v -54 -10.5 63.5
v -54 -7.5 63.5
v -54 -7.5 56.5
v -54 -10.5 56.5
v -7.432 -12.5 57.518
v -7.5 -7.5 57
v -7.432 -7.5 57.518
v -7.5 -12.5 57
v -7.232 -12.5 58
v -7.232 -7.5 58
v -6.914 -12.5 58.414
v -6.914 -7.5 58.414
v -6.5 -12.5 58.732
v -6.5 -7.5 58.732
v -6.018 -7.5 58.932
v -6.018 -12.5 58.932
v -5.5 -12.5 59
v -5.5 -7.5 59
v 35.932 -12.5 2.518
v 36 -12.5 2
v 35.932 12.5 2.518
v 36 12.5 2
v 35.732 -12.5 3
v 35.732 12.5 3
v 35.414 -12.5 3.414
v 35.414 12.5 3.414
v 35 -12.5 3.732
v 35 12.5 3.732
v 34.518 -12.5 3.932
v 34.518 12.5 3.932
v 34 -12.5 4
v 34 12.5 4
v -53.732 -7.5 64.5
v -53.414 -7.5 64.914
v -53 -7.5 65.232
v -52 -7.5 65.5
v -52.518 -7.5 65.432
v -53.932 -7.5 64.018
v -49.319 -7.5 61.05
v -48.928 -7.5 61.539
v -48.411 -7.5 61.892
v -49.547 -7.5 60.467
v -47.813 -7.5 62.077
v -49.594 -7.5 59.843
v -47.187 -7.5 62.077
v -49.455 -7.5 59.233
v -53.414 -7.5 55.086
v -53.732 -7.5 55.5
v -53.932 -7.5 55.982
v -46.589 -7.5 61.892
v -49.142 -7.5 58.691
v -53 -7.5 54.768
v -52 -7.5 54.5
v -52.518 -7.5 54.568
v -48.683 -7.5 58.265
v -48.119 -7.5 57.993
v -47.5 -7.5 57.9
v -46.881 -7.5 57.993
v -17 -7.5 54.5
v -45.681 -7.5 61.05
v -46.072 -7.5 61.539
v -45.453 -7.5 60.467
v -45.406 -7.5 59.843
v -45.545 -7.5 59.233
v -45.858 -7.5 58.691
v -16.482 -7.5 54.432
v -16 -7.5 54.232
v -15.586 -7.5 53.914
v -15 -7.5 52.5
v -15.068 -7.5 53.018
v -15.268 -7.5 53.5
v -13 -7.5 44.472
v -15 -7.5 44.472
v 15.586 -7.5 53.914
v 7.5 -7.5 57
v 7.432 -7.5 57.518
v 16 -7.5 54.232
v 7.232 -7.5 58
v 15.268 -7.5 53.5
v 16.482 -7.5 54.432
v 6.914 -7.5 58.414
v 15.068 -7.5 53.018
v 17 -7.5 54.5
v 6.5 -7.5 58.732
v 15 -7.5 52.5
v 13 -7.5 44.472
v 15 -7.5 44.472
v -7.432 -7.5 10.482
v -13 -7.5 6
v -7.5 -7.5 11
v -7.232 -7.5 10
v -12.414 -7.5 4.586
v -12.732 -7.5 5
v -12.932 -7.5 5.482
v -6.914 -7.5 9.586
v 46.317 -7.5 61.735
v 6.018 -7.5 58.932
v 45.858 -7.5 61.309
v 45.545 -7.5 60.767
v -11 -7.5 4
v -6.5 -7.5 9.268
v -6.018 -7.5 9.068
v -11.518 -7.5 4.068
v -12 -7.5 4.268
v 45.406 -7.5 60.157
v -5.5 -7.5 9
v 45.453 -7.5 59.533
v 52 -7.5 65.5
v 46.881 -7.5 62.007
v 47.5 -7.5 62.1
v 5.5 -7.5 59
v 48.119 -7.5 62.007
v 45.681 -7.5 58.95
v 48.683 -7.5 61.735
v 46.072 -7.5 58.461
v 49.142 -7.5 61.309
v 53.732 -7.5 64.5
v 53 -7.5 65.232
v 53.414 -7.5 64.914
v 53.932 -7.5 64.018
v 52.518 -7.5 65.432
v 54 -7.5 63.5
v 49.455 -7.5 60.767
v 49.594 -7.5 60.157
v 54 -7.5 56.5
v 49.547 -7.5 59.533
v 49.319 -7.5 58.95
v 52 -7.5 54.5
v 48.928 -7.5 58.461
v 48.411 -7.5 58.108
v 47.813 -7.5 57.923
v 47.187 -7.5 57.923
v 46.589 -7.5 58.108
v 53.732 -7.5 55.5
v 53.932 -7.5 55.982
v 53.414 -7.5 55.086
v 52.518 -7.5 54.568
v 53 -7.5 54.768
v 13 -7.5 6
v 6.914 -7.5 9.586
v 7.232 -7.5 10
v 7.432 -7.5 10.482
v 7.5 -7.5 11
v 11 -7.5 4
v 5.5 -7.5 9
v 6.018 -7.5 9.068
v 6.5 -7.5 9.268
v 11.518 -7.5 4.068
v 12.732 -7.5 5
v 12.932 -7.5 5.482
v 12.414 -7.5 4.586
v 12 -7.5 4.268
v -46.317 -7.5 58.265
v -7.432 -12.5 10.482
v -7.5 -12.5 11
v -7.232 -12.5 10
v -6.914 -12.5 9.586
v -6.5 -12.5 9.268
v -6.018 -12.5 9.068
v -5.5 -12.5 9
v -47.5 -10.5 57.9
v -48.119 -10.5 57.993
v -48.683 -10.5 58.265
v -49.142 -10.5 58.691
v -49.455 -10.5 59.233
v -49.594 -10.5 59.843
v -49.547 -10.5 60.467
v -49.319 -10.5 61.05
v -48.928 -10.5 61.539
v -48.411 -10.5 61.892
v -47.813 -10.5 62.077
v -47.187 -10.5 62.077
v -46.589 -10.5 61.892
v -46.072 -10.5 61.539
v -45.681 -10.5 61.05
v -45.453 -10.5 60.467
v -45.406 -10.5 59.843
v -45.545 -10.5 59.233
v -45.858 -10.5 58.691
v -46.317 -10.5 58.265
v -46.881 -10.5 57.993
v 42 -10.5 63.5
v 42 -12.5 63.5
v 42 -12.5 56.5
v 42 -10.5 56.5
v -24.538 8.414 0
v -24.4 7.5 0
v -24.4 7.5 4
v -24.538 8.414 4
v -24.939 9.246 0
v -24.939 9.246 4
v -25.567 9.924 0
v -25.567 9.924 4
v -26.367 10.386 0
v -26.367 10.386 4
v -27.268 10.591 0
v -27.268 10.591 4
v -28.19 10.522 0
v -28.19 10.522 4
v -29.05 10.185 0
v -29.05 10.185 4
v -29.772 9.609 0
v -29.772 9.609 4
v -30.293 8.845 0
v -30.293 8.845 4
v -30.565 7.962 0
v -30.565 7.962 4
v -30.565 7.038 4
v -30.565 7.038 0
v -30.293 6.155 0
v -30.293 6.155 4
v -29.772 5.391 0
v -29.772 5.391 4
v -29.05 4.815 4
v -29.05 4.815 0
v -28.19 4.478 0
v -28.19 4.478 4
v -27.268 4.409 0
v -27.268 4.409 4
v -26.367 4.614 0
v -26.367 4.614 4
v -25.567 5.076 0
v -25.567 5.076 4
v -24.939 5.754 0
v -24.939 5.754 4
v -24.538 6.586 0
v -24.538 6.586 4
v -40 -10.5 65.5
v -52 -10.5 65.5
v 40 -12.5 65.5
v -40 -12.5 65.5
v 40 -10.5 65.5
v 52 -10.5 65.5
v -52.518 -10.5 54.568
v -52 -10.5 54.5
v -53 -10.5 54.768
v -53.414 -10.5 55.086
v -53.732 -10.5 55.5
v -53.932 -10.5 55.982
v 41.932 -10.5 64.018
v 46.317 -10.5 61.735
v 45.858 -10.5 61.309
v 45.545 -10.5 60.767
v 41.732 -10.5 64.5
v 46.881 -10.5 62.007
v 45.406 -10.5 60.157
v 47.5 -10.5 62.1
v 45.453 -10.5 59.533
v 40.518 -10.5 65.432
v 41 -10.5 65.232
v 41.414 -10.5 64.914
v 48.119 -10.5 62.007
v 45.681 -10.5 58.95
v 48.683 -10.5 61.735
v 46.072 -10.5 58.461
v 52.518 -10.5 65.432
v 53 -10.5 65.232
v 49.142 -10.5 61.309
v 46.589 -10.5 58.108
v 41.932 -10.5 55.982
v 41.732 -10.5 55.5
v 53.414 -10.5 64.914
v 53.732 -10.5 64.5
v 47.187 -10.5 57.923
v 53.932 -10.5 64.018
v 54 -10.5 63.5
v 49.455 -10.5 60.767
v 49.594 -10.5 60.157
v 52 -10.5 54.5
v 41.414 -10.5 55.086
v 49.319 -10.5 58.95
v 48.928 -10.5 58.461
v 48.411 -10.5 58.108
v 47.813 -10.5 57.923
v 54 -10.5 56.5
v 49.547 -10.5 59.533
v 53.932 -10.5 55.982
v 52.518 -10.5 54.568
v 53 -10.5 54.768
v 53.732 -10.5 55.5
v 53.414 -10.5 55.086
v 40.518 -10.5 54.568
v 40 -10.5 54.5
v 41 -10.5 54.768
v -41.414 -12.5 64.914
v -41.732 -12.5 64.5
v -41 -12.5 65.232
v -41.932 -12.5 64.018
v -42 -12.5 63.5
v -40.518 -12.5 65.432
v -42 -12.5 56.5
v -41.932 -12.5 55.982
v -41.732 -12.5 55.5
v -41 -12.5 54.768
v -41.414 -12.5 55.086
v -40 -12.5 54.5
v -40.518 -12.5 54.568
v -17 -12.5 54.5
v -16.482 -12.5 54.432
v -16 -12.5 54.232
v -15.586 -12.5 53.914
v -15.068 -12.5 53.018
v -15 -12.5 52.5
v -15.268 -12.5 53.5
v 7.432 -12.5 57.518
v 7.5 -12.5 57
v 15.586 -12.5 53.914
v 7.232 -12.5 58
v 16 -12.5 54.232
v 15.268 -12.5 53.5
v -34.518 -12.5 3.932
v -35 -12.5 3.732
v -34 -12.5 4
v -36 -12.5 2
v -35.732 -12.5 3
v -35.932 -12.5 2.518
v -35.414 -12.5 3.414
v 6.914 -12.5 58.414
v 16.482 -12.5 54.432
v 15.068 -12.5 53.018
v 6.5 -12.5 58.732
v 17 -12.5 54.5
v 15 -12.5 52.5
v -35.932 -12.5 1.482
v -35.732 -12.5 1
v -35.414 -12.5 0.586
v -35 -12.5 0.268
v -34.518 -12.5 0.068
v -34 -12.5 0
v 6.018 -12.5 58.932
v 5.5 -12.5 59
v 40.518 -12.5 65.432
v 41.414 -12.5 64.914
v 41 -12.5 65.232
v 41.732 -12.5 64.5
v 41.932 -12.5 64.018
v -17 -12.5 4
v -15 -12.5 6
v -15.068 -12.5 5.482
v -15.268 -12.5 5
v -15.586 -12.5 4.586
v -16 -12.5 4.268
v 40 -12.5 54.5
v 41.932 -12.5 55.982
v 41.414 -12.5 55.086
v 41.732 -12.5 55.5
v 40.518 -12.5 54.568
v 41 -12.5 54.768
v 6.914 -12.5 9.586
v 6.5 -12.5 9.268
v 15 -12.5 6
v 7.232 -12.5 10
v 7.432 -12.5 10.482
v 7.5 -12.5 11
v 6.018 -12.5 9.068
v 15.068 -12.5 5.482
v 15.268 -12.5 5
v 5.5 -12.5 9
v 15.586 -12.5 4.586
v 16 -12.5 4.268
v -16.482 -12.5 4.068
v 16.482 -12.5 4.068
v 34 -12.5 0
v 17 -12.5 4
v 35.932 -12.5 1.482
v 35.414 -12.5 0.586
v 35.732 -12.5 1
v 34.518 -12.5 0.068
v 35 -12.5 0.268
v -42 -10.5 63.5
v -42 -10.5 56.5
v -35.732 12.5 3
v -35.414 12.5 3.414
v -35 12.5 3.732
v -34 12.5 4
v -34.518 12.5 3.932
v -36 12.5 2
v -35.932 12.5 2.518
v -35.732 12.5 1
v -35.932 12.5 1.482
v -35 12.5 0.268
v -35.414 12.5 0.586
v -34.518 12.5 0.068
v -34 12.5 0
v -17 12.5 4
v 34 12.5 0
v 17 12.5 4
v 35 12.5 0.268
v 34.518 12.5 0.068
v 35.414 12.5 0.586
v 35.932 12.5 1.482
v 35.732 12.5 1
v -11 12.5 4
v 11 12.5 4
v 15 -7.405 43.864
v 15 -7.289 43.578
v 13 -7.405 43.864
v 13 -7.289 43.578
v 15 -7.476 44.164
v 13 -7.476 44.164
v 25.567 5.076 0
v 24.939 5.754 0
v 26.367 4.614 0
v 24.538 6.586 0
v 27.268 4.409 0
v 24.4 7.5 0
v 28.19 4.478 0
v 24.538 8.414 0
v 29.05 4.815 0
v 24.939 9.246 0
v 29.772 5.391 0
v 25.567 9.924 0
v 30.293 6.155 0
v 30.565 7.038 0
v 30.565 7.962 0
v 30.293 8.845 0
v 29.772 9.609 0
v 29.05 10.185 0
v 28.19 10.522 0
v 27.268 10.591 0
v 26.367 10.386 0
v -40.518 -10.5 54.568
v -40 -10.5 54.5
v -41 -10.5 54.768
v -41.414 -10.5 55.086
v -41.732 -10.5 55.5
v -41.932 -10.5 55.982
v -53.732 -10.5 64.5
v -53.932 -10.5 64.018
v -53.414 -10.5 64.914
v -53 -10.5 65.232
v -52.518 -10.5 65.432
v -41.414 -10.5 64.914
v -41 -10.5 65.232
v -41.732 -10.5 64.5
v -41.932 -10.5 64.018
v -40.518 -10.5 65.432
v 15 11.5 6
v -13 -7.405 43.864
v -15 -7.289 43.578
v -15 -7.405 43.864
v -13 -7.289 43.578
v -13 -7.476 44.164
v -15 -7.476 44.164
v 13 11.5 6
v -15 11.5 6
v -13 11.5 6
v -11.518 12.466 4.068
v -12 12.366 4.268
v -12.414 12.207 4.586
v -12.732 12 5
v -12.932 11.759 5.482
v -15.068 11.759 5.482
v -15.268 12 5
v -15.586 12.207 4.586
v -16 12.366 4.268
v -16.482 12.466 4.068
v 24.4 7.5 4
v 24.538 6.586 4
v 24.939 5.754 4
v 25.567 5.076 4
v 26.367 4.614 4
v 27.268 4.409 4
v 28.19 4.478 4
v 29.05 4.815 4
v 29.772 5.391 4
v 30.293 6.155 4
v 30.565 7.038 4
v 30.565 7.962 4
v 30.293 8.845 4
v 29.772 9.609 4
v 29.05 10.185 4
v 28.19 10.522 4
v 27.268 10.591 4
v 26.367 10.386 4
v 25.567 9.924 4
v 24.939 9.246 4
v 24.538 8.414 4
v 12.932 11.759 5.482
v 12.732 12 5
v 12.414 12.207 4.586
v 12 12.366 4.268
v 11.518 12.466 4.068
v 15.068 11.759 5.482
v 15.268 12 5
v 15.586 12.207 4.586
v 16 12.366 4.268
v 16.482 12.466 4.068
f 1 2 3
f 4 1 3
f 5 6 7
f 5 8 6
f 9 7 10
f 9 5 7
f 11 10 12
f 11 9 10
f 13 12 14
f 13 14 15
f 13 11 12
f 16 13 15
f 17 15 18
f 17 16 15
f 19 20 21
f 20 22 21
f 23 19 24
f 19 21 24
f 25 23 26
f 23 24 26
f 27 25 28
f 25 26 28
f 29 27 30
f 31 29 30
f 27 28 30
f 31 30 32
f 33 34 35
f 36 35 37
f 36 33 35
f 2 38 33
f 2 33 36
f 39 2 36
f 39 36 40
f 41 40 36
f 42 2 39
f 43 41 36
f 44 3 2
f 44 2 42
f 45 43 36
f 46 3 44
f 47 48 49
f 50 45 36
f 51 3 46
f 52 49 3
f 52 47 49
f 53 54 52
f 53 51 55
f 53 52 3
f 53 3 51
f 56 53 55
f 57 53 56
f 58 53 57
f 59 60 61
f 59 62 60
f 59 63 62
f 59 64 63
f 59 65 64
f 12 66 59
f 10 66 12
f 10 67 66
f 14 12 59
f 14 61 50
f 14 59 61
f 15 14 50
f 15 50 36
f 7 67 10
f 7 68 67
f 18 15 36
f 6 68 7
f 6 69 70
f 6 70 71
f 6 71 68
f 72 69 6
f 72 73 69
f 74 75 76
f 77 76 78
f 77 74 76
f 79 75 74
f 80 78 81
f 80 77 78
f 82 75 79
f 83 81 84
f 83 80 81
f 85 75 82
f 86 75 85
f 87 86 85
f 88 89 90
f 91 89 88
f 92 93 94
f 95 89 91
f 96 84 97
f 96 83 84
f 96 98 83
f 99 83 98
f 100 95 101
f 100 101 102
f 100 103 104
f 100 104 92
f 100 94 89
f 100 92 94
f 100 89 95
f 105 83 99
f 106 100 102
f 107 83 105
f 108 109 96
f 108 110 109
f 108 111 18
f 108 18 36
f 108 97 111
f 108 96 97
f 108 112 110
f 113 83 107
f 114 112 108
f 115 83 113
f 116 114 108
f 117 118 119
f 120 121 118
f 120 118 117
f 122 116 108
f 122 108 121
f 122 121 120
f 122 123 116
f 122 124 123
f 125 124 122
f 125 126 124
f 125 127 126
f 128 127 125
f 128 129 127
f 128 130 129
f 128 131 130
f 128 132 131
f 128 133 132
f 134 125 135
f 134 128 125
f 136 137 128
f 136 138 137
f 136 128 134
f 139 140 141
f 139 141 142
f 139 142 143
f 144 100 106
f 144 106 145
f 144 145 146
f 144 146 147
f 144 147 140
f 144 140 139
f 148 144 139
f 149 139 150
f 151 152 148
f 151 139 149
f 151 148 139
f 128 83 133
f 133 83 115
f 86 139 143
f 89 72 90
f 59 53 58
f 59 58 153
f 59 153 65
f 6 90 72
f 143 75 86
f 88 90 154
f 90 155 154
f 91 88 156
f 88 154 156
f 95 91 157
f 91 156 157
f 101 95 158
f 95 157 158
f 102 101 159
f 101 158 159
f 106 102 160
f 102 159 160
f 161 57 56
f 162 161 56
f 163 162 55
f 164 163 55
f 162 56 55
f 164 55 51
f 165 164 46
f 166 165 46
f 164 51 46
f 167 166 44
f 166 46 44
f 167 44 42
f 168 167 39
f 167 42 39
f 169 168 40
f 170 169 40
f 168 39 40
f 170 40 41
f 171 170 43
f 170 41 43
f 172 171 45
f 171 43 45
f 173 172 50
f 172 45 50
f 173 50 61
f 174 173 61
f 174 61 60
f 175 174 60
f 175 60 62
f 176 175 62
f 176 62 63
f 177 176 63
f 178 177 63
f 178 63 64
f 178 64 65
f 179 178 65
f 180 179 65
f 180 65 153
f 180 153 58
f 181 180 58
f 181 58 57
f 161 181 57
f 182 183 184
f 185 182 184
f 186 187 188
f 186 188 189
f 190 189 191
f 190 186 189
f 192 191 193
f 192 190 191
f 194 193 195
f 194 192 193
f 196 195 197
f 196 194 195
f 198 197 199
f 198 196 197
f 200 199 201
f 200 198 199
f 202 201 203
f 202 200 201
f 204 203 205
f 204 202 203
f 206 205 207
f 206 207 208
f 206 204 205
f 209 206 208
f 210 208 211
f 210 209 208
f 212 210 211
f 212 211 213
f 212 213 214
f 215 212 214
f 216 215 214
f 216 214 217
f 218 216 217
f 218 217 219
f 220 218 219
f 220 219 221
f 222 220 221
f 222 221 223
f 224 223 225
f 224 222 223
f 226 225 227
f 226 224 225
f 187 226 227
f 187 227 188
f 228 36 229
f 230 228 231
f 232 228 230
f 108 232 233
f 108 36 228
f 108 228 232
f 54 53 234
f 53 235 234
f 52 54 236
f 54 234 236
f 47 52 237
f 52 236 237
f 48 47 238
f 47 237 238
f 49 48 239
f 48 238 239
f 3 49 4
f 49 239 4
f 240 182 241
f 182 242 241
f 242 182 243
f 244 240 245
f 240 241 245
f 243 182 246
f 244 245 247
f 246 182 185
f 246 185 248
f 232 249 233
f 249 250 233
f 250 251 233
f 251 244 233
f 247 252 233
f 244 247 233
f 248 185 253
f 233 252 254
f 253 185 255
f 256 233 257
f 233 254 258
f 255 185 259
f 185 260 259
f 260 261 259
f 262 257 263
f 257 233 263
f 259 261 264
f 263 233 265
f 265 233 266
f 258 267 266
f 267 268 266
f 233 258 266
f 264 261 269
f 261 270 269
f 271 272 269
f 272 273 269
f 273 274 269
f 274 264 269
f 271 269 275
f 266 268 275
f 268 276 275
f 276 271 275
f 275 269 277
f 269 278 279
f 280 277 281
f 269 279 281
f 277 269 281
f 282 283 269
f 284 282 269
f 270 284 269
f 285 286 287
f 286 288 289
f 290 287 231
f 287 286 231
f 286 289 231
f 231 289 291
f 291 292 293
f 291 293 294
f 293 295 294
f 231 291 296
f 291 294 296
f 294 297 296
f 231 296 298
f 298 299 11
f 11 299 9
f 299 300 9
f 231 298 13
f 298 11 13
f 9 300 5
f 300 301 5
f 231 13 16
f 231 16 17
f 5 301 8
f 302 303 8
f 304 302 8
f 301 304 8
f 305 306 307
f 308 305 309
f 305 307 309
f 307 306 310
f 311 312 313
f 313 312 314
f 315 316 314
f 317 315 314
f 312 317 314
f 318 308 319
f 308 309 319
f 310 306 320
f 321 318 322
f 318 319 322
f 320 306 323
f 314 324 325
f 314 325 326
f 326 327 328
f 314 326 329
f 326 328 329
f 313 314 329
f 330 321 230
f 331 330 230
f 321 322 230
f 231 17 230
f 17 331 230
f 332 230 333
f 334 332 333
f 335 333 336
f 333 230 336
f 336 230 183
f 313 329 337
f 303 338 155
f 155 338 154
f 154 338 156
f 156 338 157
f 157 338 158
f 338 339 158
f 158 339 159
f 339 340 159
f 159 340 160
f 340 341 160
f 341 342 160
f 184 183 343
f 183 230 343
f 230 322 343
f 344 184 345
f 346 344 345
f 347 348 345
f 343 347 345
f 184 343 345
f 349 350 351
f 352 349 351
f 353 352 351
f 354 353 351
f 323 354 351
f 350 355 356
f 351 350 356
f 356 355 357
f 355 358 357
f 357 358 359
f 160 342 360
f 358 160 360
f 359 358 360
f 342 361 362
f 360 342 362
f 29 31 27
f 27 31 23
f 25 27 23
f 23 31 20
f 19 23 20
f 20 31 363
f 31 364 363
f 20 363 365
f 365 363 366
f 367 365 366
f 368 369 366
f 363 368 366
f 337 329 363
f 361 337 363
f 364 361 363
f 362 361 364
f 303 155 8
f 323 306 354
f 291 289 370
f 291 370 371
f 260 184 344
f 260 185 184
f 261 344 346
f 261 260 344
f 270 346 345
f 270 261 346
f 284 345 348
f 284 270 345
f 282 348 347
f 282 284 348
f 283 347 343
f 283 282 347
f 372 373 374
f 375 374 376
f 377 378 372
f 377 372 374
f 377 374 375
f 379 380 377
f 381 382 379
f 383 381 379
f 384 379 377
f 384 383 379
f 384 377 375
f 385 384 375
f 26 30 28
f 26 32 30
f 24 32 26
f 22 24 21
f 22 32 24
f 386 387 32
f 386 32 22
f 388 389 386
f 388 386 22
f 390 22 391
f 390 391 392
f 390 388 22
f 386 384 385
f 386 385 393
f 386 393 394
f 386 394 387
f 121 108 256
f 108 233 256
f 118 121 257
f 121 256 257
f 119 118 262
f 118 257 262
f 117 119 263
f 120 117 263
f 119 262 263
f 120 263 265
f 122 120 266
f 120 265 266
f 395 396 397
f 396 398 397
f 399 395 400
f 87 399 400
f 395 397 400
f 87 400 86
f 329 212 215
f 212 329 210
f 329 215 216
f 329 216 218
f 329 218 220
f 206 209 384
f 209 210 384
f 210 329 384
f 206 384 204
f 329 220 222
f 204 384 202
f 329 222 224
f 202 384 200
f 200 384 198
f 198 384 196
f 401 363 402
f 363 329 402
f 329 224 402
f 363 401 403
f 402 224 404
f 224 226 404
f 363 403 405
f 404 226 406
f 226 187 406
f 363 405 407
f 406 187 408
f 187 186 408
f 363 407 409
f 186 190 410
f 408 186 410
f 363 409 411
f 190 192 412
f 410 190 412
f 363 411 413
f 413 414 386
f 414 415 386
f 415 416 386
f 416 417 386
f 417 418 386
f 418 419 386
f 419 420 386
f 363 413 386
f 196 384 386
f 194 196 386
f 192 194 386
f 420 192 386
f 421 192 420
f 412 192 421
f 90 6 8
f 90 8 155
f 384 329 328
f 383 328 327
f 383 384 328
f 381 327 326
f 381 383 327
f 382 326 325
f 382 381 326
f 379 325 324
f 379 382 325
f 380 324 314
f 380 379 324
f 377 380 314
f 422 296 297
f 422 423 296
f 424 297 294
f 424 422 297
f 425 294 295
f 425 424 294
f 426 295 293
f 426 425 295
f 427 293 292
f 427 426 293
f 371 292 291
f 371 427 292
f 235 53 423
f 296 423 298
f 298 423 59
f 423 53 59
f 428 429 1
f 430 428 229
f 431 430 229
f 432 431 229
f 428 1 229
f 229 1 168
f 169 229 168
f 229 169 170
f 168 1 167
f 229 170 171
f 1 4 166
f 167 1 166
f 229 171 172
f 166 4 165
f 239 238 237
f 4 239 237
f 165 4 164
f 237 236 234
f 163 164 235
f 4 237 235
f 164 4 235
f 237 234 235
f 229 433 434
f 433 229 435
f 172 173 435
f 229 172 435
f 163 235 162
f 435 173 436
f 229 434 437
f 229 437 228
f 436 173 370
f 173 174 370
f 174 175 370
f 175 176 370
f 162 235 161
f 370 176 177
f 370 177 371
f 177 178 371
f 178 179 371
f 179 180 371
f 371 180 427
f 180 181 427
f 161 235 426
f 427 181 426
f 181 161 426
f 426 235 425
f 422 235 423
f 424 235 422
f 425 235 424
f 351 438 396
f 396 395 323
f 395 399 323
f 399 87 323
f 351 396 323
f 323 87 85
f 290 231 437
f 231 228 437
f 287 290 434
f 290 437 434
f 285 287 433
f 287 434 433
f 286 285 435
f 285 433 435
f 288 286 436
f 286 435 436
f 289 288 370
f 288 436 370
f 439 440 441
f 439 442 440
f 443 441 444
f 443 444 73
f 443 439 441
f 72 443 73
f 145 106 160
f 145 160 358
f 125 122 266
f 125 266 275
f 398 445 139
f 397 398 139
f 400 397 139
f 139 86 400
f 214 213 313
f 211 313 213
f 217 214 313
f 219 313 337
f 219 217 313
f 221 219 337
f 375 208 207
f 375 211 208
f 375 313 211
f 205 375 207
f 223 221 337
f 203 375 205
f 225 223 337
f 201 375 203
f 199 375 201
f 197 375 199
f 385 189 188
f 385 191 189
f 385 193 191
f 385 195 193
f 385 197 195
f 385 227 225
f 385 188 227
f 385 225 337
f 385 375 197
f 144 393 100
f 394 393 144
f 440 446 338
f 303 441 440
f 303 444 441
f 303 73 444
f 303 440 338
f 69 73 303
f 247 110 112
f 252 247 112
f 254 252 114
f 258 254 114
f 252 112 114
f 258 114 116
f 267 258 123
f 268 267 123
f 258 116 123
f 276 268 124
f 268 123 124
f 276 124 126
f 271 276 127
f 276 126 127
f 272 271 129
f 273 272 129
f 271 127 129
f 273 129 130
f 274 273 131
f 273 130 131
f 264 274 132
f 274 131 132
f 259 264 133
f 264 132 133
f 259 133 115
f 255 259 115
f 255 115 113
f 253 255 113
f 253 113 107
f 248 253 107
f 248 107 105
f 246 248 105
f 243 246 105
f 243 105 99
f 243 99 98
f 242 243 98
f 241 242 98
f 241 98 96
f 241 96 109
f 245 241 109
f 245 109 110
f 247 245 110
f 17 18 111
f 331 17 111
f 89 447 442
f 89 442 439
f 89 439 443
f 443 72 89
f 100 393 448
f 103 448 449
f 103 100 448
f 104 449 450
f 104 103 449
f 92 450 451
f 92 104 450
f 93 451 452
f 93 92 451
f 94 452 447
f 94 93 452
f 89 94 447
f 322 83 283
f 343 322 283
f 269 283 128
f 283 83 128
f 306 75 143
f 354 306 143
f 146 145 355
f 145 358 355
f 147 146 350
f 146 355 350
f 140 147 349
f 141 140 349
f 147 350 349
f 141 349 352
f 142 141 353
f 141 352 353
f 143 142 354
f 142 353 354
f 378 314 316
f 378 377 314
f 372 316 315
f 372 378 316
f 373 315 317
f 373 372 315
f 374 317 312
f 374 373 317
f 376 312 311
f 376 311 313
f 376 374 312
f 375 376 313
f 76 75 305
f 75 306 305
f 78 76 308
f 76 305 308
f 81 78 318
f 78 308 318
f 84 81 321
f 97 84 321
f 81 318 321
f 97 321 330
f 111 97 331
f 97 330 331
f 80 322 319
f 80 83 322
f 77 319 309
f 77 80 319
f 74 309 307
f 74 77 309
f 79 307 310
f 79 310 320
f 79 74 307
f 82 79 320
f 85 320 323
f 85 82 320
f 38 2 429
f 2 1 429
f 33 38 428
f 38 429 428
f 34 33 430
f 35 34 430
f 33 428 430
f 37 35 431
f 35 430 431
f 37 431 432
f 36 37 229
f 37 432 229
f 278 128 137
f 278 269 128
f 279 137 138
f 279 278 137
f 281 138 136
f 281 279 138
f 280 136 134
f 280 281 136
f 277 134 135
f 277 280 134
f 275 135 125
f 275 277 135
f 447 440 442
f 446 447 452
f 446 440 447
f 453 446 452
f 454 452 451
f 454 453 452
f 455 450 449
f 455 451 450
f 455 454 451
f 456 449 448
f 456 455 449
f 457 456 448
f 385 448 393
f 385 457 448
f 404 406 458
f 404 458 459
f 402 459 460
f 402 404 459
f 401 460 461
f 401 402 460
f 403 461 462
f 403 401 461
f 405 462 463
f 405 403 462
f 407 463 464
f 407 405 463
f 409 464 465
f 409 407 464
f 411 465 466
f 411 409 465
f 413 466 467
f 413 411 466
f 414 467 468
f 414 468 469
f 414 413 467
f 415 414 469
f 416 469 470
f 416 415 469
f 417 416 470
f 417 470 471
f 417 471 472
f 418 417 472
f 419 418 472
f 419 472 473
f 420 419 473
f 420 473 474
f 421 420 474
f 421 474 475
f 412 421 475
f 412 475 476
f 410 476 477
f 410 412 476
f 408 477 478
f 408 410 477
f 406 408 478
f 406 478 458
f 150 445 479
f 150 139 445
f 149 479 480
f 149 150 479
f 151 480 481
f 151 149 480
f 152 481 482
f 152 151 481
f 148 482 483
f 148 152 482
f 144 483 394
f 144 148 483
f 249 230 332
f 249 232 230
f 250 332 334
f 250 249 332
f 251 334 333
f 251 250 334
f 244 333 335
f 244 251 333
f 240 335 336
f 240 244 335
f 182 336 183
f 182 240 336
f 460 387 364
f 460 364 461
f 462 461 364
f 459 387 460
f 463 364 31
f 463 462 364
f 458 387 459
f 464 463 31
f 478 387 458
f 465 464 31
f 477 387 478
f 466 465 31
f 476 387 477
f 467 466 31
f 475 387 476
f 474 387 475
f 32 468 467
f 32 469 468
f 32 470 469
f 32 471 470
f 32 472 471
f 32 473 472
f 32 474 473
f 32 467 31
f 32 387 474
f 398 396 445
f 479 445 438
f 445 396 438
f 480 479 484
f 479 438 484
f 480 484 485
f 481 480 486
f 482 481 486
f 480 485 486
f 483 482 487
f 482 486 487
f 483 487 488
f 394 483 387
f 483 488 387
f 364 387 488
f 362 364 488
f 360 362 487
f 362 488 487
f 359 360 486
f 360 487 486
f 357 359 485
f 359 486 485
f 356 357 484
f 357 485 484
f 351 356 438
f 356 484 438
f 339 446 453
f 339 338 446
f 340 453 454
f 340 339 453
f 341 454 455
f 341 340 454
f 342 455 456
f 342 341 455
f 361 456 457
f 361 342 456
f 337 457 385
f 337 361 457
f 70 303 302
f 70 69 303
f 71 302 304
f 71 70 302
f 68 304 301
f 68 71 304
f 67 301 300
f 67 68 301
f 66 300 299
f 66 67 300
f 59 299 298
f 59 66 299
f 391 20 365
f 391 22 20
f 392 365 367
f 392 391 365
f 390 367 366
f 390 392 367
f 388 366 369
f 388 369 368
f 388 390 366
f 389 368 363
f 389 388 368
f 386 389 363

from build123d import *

# Parameters (mm, degrees)
SKETCH_1_W          = 72
SKETCH_1_H          = 25
SKETCH_1_R          = 3.1
EXTRUDE_1_DEPTH     = 4
EXTRUDE_START       = -4
SKETCH_3_W          = 30
SKETCH_3_H          = 5
EXTRUDE_2_DEPTH     = 60
SKETCH_5_W          = 108
SKETCH_5_H          = 11
SKETCH_5_R          = 2.1
EXTRUDE_3_DEPTH     = 5
CUT_EXTRUDE_START   = -5
SKETCH_6_W          = 12
SKETCH_6_H          = 11
CUT_EXTRUDE_1_DEPTH = 2
SKETCH_7_W          = 15
SKETCH_7_H          = 50
CUT_EXTRUDE_2_DEPTH = 88.213817713
EXTRUDE_4_DEPTH     = 2
EXTRUDE_START_2     = -30
EXTRUDE_5_DEPTH     = 2
FILLET_1_R          = 2


with BuildPart() as part:
    # 草图1 → 凸台-拉伸1 (new body)
    with BuildSketch(Plane.XY):
        Rectangle(SKETCH_1_W, SKETCH_1_H)
        with Locations((-27.5, 7.5)):
            Circle(SKETCH_1_R, mode=Mode.SUBTRACT)
        with Locations(Location((27.5, 7.5, 0), (0, 0, 180))):
            Circle(SKETCH_1_R, mode=Mode.SUBTRACT)
    extrude(amount=EXTRUDE_1_DEPTH)

    # 草图3 → 凸台-拉伸2 (add)
    with BuildSketch(Plane.XY.offset(4).offset(EXTRUDE_START)):
        with Locations((0, -10)):
            Rectangle(SKETCH_3_W, SKETCH_3_H)
    extrude(amount=EXTRUDE_2_DEPTH)

    # 草图5 → 凸台-拉伸3 (add, through all)
    with BuildSketch(Plane(origin=(0, -7.5, 0), x_dir=(1, 0, 0), z_dir=(0, 1, 0))):
        with Locations((0, -60)):
            Rectangle(SKETCH_5_W, SKETCH_5_H)
        with Locations(Location((47.5, -60, 0), (0, 0, 270))):
            Circle(SKETCH_5_R, mode=Mode.SUBTRACT)
        with Locations(Location((-47.5, -60, 0), (0, 0, 90))):
            Circle(SKETCH_5_R, mode=Mode.SUBTRACT)
    extrude(amount=-EXTRUDE_3_DEPTH)

    # 草图6 → 切除-拉伸1 (cut)
    with BuildSketch(Plane(origin=(0, -7.5, 0), x_dir=(1, 0, 0), z_dir=(0, 1, 0)).offset(CUT_EXTRUDE_START)):
        with Locations((-48, -60)):
            Rectangle(SKETCH_6_W, SKETCH_6_H)
        with Locations((48, -60)):
            Rectangle(SKETCH_6_W, SKETCH_6_H)
    extrude(amount=CUT_EXTRUDE_1_DEPTH, mode=Mode.SUBTRACT)

    # 草图7 → 切除-拉伸2 (cut, through all)
    with BuildSketch(Plane(origin=(0, -7.5, 0), x_dir=(1, 0, 0), z_dir=(0, 1, 0))):
        with Locations((0, -34)):
            Rectangle(SKETCH_7_W, SKETCH_7_H)
    extrude(amount=-CUT_EXTRUDE_2_DEPTH, mode=Mode.SUBTRACT)

    # 草图8 → 凸台-拉伸4 (add)
    with BuildSketch(Plane.ZY.offset(15)):
        Polygon((4, -7.5), (44, -7.5), (4, 12.5), align=None)
    extrude(amount=-EXTRUDE_4_DEPTH)

    # 草图8<2> → 凸台-拉伸5 (add)
    with BuildSketch(Plane.ZY.offset(15).offset(EXTRUDE_START_2)):
        Polygon((4, -7.5), (44, -7.5), (4, 12.5), align=None)
    extrude(amount=EXTRUDE_5_DEPTH)

    # 圆角1
    fillet_1_edges = [part.edges().sort_by_distance(p)[0] for p in [
        (15, 0, 4),
        (36, 0, 4),
        (36, 0, 0),
        (-36, 0, 0),
        (-36, 0, 4),
        (-15, -10, 54.5),
        (-54, -9, 54.5),
        (-54, -9, 65.5),
        (54, -9, 65.5),
        (54, -9, 54.5),
        (15, -10, 54.5),
        (-15, 0, 4),
        (-42, -11.5, 54.5),
        (42, -11.5, 54.5),
        (42, -11.5, 65.5),
        (-42, -11.5, 65.5),
        (-7.5, -10, 59),
        (-7.5, -10, 9),
        (7.5, -10, 59),
        (7.5, -10, 9),
        (14, -7.5, 44),
        (-14, -7.5, 44),
        (-13, 2.5, 4),
        (13, 2.5, 4),
    ]]
    fillet(fillet_1_edges, radius=FILLET_1_R - 0.0001)  # a hair under: the kernel refuses the full size


solid = part.part
